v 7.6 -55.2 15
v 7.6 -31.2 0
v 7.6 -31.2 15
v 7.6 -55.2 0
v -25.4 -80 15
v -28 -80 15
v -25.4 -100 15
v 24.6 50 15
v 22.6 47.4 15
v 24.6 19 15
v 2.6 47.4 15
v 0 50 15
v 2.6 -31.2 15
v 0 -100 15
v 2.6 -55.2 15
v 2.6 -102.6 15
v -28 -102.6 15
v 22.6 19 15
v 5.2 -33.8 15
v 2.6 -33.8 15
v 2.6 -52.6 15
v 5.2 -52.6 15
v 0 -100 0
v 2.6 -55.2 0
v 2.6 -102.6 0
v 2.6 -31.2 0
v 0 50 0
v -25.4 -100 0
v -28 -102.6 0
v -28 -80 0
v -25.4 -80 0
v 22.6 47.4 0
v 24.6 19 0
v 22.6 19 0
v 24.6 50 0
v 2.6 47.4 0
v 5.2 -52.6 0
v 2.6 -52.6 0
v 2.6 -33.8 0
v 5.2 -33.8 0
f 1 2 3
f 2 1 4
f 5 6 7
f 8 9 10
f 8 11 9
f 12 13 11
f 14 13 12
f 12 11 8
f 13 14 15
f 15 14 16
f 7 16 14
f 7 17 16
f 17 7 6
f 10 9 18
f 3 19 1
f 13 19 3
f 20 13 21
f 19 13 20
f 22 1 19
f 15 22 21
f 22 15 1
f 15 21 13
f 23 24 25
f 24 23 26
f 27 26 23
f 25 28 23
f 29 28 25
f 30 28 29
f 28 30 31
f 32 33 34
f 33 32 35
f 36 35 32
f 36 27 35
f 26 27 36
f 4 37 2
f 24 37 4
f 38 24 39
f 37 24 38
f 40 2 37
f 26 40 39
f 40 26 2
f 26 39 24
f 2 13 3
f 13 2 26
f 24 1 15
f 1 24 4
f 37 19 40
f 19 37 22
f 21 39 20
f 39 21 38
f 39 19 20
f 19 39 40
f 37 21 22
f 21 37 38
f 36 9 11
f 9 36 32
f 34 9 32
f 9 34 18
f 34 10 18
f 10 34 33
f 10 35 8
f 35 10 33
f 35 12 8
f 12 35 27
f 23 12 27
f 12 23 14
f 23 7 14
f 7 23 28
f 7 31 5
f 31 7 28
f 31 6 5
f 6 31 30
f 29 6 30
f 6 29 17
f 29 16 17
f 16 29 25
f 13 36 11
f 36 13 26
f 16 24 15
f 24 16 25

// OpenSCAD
linear_extrude(15) {
    polygon([[0,-55],[0,50],[20+2.6+2,50],[24.6,19],[22.6,19],[22.6,47.4],[2.6,47.4],[2.6,-55],[2.6,-102.6],[-28,-102.6],[-28,-80],[-25.4,-80],[-25.4,-100],[0,-100]]);
  }
difference() {
    translate([2.5,-55.2,0]) cube([5.1,24,15]);
    translate([2.6,-52.6,0]) cube([2.6,18.8,15]);
}

/*
difference() {
    cube([15,60,2.4],true);
    translate([0,0,-1.2]) cylinder(h=2.4,d=5,$fn=360);
}
*/
